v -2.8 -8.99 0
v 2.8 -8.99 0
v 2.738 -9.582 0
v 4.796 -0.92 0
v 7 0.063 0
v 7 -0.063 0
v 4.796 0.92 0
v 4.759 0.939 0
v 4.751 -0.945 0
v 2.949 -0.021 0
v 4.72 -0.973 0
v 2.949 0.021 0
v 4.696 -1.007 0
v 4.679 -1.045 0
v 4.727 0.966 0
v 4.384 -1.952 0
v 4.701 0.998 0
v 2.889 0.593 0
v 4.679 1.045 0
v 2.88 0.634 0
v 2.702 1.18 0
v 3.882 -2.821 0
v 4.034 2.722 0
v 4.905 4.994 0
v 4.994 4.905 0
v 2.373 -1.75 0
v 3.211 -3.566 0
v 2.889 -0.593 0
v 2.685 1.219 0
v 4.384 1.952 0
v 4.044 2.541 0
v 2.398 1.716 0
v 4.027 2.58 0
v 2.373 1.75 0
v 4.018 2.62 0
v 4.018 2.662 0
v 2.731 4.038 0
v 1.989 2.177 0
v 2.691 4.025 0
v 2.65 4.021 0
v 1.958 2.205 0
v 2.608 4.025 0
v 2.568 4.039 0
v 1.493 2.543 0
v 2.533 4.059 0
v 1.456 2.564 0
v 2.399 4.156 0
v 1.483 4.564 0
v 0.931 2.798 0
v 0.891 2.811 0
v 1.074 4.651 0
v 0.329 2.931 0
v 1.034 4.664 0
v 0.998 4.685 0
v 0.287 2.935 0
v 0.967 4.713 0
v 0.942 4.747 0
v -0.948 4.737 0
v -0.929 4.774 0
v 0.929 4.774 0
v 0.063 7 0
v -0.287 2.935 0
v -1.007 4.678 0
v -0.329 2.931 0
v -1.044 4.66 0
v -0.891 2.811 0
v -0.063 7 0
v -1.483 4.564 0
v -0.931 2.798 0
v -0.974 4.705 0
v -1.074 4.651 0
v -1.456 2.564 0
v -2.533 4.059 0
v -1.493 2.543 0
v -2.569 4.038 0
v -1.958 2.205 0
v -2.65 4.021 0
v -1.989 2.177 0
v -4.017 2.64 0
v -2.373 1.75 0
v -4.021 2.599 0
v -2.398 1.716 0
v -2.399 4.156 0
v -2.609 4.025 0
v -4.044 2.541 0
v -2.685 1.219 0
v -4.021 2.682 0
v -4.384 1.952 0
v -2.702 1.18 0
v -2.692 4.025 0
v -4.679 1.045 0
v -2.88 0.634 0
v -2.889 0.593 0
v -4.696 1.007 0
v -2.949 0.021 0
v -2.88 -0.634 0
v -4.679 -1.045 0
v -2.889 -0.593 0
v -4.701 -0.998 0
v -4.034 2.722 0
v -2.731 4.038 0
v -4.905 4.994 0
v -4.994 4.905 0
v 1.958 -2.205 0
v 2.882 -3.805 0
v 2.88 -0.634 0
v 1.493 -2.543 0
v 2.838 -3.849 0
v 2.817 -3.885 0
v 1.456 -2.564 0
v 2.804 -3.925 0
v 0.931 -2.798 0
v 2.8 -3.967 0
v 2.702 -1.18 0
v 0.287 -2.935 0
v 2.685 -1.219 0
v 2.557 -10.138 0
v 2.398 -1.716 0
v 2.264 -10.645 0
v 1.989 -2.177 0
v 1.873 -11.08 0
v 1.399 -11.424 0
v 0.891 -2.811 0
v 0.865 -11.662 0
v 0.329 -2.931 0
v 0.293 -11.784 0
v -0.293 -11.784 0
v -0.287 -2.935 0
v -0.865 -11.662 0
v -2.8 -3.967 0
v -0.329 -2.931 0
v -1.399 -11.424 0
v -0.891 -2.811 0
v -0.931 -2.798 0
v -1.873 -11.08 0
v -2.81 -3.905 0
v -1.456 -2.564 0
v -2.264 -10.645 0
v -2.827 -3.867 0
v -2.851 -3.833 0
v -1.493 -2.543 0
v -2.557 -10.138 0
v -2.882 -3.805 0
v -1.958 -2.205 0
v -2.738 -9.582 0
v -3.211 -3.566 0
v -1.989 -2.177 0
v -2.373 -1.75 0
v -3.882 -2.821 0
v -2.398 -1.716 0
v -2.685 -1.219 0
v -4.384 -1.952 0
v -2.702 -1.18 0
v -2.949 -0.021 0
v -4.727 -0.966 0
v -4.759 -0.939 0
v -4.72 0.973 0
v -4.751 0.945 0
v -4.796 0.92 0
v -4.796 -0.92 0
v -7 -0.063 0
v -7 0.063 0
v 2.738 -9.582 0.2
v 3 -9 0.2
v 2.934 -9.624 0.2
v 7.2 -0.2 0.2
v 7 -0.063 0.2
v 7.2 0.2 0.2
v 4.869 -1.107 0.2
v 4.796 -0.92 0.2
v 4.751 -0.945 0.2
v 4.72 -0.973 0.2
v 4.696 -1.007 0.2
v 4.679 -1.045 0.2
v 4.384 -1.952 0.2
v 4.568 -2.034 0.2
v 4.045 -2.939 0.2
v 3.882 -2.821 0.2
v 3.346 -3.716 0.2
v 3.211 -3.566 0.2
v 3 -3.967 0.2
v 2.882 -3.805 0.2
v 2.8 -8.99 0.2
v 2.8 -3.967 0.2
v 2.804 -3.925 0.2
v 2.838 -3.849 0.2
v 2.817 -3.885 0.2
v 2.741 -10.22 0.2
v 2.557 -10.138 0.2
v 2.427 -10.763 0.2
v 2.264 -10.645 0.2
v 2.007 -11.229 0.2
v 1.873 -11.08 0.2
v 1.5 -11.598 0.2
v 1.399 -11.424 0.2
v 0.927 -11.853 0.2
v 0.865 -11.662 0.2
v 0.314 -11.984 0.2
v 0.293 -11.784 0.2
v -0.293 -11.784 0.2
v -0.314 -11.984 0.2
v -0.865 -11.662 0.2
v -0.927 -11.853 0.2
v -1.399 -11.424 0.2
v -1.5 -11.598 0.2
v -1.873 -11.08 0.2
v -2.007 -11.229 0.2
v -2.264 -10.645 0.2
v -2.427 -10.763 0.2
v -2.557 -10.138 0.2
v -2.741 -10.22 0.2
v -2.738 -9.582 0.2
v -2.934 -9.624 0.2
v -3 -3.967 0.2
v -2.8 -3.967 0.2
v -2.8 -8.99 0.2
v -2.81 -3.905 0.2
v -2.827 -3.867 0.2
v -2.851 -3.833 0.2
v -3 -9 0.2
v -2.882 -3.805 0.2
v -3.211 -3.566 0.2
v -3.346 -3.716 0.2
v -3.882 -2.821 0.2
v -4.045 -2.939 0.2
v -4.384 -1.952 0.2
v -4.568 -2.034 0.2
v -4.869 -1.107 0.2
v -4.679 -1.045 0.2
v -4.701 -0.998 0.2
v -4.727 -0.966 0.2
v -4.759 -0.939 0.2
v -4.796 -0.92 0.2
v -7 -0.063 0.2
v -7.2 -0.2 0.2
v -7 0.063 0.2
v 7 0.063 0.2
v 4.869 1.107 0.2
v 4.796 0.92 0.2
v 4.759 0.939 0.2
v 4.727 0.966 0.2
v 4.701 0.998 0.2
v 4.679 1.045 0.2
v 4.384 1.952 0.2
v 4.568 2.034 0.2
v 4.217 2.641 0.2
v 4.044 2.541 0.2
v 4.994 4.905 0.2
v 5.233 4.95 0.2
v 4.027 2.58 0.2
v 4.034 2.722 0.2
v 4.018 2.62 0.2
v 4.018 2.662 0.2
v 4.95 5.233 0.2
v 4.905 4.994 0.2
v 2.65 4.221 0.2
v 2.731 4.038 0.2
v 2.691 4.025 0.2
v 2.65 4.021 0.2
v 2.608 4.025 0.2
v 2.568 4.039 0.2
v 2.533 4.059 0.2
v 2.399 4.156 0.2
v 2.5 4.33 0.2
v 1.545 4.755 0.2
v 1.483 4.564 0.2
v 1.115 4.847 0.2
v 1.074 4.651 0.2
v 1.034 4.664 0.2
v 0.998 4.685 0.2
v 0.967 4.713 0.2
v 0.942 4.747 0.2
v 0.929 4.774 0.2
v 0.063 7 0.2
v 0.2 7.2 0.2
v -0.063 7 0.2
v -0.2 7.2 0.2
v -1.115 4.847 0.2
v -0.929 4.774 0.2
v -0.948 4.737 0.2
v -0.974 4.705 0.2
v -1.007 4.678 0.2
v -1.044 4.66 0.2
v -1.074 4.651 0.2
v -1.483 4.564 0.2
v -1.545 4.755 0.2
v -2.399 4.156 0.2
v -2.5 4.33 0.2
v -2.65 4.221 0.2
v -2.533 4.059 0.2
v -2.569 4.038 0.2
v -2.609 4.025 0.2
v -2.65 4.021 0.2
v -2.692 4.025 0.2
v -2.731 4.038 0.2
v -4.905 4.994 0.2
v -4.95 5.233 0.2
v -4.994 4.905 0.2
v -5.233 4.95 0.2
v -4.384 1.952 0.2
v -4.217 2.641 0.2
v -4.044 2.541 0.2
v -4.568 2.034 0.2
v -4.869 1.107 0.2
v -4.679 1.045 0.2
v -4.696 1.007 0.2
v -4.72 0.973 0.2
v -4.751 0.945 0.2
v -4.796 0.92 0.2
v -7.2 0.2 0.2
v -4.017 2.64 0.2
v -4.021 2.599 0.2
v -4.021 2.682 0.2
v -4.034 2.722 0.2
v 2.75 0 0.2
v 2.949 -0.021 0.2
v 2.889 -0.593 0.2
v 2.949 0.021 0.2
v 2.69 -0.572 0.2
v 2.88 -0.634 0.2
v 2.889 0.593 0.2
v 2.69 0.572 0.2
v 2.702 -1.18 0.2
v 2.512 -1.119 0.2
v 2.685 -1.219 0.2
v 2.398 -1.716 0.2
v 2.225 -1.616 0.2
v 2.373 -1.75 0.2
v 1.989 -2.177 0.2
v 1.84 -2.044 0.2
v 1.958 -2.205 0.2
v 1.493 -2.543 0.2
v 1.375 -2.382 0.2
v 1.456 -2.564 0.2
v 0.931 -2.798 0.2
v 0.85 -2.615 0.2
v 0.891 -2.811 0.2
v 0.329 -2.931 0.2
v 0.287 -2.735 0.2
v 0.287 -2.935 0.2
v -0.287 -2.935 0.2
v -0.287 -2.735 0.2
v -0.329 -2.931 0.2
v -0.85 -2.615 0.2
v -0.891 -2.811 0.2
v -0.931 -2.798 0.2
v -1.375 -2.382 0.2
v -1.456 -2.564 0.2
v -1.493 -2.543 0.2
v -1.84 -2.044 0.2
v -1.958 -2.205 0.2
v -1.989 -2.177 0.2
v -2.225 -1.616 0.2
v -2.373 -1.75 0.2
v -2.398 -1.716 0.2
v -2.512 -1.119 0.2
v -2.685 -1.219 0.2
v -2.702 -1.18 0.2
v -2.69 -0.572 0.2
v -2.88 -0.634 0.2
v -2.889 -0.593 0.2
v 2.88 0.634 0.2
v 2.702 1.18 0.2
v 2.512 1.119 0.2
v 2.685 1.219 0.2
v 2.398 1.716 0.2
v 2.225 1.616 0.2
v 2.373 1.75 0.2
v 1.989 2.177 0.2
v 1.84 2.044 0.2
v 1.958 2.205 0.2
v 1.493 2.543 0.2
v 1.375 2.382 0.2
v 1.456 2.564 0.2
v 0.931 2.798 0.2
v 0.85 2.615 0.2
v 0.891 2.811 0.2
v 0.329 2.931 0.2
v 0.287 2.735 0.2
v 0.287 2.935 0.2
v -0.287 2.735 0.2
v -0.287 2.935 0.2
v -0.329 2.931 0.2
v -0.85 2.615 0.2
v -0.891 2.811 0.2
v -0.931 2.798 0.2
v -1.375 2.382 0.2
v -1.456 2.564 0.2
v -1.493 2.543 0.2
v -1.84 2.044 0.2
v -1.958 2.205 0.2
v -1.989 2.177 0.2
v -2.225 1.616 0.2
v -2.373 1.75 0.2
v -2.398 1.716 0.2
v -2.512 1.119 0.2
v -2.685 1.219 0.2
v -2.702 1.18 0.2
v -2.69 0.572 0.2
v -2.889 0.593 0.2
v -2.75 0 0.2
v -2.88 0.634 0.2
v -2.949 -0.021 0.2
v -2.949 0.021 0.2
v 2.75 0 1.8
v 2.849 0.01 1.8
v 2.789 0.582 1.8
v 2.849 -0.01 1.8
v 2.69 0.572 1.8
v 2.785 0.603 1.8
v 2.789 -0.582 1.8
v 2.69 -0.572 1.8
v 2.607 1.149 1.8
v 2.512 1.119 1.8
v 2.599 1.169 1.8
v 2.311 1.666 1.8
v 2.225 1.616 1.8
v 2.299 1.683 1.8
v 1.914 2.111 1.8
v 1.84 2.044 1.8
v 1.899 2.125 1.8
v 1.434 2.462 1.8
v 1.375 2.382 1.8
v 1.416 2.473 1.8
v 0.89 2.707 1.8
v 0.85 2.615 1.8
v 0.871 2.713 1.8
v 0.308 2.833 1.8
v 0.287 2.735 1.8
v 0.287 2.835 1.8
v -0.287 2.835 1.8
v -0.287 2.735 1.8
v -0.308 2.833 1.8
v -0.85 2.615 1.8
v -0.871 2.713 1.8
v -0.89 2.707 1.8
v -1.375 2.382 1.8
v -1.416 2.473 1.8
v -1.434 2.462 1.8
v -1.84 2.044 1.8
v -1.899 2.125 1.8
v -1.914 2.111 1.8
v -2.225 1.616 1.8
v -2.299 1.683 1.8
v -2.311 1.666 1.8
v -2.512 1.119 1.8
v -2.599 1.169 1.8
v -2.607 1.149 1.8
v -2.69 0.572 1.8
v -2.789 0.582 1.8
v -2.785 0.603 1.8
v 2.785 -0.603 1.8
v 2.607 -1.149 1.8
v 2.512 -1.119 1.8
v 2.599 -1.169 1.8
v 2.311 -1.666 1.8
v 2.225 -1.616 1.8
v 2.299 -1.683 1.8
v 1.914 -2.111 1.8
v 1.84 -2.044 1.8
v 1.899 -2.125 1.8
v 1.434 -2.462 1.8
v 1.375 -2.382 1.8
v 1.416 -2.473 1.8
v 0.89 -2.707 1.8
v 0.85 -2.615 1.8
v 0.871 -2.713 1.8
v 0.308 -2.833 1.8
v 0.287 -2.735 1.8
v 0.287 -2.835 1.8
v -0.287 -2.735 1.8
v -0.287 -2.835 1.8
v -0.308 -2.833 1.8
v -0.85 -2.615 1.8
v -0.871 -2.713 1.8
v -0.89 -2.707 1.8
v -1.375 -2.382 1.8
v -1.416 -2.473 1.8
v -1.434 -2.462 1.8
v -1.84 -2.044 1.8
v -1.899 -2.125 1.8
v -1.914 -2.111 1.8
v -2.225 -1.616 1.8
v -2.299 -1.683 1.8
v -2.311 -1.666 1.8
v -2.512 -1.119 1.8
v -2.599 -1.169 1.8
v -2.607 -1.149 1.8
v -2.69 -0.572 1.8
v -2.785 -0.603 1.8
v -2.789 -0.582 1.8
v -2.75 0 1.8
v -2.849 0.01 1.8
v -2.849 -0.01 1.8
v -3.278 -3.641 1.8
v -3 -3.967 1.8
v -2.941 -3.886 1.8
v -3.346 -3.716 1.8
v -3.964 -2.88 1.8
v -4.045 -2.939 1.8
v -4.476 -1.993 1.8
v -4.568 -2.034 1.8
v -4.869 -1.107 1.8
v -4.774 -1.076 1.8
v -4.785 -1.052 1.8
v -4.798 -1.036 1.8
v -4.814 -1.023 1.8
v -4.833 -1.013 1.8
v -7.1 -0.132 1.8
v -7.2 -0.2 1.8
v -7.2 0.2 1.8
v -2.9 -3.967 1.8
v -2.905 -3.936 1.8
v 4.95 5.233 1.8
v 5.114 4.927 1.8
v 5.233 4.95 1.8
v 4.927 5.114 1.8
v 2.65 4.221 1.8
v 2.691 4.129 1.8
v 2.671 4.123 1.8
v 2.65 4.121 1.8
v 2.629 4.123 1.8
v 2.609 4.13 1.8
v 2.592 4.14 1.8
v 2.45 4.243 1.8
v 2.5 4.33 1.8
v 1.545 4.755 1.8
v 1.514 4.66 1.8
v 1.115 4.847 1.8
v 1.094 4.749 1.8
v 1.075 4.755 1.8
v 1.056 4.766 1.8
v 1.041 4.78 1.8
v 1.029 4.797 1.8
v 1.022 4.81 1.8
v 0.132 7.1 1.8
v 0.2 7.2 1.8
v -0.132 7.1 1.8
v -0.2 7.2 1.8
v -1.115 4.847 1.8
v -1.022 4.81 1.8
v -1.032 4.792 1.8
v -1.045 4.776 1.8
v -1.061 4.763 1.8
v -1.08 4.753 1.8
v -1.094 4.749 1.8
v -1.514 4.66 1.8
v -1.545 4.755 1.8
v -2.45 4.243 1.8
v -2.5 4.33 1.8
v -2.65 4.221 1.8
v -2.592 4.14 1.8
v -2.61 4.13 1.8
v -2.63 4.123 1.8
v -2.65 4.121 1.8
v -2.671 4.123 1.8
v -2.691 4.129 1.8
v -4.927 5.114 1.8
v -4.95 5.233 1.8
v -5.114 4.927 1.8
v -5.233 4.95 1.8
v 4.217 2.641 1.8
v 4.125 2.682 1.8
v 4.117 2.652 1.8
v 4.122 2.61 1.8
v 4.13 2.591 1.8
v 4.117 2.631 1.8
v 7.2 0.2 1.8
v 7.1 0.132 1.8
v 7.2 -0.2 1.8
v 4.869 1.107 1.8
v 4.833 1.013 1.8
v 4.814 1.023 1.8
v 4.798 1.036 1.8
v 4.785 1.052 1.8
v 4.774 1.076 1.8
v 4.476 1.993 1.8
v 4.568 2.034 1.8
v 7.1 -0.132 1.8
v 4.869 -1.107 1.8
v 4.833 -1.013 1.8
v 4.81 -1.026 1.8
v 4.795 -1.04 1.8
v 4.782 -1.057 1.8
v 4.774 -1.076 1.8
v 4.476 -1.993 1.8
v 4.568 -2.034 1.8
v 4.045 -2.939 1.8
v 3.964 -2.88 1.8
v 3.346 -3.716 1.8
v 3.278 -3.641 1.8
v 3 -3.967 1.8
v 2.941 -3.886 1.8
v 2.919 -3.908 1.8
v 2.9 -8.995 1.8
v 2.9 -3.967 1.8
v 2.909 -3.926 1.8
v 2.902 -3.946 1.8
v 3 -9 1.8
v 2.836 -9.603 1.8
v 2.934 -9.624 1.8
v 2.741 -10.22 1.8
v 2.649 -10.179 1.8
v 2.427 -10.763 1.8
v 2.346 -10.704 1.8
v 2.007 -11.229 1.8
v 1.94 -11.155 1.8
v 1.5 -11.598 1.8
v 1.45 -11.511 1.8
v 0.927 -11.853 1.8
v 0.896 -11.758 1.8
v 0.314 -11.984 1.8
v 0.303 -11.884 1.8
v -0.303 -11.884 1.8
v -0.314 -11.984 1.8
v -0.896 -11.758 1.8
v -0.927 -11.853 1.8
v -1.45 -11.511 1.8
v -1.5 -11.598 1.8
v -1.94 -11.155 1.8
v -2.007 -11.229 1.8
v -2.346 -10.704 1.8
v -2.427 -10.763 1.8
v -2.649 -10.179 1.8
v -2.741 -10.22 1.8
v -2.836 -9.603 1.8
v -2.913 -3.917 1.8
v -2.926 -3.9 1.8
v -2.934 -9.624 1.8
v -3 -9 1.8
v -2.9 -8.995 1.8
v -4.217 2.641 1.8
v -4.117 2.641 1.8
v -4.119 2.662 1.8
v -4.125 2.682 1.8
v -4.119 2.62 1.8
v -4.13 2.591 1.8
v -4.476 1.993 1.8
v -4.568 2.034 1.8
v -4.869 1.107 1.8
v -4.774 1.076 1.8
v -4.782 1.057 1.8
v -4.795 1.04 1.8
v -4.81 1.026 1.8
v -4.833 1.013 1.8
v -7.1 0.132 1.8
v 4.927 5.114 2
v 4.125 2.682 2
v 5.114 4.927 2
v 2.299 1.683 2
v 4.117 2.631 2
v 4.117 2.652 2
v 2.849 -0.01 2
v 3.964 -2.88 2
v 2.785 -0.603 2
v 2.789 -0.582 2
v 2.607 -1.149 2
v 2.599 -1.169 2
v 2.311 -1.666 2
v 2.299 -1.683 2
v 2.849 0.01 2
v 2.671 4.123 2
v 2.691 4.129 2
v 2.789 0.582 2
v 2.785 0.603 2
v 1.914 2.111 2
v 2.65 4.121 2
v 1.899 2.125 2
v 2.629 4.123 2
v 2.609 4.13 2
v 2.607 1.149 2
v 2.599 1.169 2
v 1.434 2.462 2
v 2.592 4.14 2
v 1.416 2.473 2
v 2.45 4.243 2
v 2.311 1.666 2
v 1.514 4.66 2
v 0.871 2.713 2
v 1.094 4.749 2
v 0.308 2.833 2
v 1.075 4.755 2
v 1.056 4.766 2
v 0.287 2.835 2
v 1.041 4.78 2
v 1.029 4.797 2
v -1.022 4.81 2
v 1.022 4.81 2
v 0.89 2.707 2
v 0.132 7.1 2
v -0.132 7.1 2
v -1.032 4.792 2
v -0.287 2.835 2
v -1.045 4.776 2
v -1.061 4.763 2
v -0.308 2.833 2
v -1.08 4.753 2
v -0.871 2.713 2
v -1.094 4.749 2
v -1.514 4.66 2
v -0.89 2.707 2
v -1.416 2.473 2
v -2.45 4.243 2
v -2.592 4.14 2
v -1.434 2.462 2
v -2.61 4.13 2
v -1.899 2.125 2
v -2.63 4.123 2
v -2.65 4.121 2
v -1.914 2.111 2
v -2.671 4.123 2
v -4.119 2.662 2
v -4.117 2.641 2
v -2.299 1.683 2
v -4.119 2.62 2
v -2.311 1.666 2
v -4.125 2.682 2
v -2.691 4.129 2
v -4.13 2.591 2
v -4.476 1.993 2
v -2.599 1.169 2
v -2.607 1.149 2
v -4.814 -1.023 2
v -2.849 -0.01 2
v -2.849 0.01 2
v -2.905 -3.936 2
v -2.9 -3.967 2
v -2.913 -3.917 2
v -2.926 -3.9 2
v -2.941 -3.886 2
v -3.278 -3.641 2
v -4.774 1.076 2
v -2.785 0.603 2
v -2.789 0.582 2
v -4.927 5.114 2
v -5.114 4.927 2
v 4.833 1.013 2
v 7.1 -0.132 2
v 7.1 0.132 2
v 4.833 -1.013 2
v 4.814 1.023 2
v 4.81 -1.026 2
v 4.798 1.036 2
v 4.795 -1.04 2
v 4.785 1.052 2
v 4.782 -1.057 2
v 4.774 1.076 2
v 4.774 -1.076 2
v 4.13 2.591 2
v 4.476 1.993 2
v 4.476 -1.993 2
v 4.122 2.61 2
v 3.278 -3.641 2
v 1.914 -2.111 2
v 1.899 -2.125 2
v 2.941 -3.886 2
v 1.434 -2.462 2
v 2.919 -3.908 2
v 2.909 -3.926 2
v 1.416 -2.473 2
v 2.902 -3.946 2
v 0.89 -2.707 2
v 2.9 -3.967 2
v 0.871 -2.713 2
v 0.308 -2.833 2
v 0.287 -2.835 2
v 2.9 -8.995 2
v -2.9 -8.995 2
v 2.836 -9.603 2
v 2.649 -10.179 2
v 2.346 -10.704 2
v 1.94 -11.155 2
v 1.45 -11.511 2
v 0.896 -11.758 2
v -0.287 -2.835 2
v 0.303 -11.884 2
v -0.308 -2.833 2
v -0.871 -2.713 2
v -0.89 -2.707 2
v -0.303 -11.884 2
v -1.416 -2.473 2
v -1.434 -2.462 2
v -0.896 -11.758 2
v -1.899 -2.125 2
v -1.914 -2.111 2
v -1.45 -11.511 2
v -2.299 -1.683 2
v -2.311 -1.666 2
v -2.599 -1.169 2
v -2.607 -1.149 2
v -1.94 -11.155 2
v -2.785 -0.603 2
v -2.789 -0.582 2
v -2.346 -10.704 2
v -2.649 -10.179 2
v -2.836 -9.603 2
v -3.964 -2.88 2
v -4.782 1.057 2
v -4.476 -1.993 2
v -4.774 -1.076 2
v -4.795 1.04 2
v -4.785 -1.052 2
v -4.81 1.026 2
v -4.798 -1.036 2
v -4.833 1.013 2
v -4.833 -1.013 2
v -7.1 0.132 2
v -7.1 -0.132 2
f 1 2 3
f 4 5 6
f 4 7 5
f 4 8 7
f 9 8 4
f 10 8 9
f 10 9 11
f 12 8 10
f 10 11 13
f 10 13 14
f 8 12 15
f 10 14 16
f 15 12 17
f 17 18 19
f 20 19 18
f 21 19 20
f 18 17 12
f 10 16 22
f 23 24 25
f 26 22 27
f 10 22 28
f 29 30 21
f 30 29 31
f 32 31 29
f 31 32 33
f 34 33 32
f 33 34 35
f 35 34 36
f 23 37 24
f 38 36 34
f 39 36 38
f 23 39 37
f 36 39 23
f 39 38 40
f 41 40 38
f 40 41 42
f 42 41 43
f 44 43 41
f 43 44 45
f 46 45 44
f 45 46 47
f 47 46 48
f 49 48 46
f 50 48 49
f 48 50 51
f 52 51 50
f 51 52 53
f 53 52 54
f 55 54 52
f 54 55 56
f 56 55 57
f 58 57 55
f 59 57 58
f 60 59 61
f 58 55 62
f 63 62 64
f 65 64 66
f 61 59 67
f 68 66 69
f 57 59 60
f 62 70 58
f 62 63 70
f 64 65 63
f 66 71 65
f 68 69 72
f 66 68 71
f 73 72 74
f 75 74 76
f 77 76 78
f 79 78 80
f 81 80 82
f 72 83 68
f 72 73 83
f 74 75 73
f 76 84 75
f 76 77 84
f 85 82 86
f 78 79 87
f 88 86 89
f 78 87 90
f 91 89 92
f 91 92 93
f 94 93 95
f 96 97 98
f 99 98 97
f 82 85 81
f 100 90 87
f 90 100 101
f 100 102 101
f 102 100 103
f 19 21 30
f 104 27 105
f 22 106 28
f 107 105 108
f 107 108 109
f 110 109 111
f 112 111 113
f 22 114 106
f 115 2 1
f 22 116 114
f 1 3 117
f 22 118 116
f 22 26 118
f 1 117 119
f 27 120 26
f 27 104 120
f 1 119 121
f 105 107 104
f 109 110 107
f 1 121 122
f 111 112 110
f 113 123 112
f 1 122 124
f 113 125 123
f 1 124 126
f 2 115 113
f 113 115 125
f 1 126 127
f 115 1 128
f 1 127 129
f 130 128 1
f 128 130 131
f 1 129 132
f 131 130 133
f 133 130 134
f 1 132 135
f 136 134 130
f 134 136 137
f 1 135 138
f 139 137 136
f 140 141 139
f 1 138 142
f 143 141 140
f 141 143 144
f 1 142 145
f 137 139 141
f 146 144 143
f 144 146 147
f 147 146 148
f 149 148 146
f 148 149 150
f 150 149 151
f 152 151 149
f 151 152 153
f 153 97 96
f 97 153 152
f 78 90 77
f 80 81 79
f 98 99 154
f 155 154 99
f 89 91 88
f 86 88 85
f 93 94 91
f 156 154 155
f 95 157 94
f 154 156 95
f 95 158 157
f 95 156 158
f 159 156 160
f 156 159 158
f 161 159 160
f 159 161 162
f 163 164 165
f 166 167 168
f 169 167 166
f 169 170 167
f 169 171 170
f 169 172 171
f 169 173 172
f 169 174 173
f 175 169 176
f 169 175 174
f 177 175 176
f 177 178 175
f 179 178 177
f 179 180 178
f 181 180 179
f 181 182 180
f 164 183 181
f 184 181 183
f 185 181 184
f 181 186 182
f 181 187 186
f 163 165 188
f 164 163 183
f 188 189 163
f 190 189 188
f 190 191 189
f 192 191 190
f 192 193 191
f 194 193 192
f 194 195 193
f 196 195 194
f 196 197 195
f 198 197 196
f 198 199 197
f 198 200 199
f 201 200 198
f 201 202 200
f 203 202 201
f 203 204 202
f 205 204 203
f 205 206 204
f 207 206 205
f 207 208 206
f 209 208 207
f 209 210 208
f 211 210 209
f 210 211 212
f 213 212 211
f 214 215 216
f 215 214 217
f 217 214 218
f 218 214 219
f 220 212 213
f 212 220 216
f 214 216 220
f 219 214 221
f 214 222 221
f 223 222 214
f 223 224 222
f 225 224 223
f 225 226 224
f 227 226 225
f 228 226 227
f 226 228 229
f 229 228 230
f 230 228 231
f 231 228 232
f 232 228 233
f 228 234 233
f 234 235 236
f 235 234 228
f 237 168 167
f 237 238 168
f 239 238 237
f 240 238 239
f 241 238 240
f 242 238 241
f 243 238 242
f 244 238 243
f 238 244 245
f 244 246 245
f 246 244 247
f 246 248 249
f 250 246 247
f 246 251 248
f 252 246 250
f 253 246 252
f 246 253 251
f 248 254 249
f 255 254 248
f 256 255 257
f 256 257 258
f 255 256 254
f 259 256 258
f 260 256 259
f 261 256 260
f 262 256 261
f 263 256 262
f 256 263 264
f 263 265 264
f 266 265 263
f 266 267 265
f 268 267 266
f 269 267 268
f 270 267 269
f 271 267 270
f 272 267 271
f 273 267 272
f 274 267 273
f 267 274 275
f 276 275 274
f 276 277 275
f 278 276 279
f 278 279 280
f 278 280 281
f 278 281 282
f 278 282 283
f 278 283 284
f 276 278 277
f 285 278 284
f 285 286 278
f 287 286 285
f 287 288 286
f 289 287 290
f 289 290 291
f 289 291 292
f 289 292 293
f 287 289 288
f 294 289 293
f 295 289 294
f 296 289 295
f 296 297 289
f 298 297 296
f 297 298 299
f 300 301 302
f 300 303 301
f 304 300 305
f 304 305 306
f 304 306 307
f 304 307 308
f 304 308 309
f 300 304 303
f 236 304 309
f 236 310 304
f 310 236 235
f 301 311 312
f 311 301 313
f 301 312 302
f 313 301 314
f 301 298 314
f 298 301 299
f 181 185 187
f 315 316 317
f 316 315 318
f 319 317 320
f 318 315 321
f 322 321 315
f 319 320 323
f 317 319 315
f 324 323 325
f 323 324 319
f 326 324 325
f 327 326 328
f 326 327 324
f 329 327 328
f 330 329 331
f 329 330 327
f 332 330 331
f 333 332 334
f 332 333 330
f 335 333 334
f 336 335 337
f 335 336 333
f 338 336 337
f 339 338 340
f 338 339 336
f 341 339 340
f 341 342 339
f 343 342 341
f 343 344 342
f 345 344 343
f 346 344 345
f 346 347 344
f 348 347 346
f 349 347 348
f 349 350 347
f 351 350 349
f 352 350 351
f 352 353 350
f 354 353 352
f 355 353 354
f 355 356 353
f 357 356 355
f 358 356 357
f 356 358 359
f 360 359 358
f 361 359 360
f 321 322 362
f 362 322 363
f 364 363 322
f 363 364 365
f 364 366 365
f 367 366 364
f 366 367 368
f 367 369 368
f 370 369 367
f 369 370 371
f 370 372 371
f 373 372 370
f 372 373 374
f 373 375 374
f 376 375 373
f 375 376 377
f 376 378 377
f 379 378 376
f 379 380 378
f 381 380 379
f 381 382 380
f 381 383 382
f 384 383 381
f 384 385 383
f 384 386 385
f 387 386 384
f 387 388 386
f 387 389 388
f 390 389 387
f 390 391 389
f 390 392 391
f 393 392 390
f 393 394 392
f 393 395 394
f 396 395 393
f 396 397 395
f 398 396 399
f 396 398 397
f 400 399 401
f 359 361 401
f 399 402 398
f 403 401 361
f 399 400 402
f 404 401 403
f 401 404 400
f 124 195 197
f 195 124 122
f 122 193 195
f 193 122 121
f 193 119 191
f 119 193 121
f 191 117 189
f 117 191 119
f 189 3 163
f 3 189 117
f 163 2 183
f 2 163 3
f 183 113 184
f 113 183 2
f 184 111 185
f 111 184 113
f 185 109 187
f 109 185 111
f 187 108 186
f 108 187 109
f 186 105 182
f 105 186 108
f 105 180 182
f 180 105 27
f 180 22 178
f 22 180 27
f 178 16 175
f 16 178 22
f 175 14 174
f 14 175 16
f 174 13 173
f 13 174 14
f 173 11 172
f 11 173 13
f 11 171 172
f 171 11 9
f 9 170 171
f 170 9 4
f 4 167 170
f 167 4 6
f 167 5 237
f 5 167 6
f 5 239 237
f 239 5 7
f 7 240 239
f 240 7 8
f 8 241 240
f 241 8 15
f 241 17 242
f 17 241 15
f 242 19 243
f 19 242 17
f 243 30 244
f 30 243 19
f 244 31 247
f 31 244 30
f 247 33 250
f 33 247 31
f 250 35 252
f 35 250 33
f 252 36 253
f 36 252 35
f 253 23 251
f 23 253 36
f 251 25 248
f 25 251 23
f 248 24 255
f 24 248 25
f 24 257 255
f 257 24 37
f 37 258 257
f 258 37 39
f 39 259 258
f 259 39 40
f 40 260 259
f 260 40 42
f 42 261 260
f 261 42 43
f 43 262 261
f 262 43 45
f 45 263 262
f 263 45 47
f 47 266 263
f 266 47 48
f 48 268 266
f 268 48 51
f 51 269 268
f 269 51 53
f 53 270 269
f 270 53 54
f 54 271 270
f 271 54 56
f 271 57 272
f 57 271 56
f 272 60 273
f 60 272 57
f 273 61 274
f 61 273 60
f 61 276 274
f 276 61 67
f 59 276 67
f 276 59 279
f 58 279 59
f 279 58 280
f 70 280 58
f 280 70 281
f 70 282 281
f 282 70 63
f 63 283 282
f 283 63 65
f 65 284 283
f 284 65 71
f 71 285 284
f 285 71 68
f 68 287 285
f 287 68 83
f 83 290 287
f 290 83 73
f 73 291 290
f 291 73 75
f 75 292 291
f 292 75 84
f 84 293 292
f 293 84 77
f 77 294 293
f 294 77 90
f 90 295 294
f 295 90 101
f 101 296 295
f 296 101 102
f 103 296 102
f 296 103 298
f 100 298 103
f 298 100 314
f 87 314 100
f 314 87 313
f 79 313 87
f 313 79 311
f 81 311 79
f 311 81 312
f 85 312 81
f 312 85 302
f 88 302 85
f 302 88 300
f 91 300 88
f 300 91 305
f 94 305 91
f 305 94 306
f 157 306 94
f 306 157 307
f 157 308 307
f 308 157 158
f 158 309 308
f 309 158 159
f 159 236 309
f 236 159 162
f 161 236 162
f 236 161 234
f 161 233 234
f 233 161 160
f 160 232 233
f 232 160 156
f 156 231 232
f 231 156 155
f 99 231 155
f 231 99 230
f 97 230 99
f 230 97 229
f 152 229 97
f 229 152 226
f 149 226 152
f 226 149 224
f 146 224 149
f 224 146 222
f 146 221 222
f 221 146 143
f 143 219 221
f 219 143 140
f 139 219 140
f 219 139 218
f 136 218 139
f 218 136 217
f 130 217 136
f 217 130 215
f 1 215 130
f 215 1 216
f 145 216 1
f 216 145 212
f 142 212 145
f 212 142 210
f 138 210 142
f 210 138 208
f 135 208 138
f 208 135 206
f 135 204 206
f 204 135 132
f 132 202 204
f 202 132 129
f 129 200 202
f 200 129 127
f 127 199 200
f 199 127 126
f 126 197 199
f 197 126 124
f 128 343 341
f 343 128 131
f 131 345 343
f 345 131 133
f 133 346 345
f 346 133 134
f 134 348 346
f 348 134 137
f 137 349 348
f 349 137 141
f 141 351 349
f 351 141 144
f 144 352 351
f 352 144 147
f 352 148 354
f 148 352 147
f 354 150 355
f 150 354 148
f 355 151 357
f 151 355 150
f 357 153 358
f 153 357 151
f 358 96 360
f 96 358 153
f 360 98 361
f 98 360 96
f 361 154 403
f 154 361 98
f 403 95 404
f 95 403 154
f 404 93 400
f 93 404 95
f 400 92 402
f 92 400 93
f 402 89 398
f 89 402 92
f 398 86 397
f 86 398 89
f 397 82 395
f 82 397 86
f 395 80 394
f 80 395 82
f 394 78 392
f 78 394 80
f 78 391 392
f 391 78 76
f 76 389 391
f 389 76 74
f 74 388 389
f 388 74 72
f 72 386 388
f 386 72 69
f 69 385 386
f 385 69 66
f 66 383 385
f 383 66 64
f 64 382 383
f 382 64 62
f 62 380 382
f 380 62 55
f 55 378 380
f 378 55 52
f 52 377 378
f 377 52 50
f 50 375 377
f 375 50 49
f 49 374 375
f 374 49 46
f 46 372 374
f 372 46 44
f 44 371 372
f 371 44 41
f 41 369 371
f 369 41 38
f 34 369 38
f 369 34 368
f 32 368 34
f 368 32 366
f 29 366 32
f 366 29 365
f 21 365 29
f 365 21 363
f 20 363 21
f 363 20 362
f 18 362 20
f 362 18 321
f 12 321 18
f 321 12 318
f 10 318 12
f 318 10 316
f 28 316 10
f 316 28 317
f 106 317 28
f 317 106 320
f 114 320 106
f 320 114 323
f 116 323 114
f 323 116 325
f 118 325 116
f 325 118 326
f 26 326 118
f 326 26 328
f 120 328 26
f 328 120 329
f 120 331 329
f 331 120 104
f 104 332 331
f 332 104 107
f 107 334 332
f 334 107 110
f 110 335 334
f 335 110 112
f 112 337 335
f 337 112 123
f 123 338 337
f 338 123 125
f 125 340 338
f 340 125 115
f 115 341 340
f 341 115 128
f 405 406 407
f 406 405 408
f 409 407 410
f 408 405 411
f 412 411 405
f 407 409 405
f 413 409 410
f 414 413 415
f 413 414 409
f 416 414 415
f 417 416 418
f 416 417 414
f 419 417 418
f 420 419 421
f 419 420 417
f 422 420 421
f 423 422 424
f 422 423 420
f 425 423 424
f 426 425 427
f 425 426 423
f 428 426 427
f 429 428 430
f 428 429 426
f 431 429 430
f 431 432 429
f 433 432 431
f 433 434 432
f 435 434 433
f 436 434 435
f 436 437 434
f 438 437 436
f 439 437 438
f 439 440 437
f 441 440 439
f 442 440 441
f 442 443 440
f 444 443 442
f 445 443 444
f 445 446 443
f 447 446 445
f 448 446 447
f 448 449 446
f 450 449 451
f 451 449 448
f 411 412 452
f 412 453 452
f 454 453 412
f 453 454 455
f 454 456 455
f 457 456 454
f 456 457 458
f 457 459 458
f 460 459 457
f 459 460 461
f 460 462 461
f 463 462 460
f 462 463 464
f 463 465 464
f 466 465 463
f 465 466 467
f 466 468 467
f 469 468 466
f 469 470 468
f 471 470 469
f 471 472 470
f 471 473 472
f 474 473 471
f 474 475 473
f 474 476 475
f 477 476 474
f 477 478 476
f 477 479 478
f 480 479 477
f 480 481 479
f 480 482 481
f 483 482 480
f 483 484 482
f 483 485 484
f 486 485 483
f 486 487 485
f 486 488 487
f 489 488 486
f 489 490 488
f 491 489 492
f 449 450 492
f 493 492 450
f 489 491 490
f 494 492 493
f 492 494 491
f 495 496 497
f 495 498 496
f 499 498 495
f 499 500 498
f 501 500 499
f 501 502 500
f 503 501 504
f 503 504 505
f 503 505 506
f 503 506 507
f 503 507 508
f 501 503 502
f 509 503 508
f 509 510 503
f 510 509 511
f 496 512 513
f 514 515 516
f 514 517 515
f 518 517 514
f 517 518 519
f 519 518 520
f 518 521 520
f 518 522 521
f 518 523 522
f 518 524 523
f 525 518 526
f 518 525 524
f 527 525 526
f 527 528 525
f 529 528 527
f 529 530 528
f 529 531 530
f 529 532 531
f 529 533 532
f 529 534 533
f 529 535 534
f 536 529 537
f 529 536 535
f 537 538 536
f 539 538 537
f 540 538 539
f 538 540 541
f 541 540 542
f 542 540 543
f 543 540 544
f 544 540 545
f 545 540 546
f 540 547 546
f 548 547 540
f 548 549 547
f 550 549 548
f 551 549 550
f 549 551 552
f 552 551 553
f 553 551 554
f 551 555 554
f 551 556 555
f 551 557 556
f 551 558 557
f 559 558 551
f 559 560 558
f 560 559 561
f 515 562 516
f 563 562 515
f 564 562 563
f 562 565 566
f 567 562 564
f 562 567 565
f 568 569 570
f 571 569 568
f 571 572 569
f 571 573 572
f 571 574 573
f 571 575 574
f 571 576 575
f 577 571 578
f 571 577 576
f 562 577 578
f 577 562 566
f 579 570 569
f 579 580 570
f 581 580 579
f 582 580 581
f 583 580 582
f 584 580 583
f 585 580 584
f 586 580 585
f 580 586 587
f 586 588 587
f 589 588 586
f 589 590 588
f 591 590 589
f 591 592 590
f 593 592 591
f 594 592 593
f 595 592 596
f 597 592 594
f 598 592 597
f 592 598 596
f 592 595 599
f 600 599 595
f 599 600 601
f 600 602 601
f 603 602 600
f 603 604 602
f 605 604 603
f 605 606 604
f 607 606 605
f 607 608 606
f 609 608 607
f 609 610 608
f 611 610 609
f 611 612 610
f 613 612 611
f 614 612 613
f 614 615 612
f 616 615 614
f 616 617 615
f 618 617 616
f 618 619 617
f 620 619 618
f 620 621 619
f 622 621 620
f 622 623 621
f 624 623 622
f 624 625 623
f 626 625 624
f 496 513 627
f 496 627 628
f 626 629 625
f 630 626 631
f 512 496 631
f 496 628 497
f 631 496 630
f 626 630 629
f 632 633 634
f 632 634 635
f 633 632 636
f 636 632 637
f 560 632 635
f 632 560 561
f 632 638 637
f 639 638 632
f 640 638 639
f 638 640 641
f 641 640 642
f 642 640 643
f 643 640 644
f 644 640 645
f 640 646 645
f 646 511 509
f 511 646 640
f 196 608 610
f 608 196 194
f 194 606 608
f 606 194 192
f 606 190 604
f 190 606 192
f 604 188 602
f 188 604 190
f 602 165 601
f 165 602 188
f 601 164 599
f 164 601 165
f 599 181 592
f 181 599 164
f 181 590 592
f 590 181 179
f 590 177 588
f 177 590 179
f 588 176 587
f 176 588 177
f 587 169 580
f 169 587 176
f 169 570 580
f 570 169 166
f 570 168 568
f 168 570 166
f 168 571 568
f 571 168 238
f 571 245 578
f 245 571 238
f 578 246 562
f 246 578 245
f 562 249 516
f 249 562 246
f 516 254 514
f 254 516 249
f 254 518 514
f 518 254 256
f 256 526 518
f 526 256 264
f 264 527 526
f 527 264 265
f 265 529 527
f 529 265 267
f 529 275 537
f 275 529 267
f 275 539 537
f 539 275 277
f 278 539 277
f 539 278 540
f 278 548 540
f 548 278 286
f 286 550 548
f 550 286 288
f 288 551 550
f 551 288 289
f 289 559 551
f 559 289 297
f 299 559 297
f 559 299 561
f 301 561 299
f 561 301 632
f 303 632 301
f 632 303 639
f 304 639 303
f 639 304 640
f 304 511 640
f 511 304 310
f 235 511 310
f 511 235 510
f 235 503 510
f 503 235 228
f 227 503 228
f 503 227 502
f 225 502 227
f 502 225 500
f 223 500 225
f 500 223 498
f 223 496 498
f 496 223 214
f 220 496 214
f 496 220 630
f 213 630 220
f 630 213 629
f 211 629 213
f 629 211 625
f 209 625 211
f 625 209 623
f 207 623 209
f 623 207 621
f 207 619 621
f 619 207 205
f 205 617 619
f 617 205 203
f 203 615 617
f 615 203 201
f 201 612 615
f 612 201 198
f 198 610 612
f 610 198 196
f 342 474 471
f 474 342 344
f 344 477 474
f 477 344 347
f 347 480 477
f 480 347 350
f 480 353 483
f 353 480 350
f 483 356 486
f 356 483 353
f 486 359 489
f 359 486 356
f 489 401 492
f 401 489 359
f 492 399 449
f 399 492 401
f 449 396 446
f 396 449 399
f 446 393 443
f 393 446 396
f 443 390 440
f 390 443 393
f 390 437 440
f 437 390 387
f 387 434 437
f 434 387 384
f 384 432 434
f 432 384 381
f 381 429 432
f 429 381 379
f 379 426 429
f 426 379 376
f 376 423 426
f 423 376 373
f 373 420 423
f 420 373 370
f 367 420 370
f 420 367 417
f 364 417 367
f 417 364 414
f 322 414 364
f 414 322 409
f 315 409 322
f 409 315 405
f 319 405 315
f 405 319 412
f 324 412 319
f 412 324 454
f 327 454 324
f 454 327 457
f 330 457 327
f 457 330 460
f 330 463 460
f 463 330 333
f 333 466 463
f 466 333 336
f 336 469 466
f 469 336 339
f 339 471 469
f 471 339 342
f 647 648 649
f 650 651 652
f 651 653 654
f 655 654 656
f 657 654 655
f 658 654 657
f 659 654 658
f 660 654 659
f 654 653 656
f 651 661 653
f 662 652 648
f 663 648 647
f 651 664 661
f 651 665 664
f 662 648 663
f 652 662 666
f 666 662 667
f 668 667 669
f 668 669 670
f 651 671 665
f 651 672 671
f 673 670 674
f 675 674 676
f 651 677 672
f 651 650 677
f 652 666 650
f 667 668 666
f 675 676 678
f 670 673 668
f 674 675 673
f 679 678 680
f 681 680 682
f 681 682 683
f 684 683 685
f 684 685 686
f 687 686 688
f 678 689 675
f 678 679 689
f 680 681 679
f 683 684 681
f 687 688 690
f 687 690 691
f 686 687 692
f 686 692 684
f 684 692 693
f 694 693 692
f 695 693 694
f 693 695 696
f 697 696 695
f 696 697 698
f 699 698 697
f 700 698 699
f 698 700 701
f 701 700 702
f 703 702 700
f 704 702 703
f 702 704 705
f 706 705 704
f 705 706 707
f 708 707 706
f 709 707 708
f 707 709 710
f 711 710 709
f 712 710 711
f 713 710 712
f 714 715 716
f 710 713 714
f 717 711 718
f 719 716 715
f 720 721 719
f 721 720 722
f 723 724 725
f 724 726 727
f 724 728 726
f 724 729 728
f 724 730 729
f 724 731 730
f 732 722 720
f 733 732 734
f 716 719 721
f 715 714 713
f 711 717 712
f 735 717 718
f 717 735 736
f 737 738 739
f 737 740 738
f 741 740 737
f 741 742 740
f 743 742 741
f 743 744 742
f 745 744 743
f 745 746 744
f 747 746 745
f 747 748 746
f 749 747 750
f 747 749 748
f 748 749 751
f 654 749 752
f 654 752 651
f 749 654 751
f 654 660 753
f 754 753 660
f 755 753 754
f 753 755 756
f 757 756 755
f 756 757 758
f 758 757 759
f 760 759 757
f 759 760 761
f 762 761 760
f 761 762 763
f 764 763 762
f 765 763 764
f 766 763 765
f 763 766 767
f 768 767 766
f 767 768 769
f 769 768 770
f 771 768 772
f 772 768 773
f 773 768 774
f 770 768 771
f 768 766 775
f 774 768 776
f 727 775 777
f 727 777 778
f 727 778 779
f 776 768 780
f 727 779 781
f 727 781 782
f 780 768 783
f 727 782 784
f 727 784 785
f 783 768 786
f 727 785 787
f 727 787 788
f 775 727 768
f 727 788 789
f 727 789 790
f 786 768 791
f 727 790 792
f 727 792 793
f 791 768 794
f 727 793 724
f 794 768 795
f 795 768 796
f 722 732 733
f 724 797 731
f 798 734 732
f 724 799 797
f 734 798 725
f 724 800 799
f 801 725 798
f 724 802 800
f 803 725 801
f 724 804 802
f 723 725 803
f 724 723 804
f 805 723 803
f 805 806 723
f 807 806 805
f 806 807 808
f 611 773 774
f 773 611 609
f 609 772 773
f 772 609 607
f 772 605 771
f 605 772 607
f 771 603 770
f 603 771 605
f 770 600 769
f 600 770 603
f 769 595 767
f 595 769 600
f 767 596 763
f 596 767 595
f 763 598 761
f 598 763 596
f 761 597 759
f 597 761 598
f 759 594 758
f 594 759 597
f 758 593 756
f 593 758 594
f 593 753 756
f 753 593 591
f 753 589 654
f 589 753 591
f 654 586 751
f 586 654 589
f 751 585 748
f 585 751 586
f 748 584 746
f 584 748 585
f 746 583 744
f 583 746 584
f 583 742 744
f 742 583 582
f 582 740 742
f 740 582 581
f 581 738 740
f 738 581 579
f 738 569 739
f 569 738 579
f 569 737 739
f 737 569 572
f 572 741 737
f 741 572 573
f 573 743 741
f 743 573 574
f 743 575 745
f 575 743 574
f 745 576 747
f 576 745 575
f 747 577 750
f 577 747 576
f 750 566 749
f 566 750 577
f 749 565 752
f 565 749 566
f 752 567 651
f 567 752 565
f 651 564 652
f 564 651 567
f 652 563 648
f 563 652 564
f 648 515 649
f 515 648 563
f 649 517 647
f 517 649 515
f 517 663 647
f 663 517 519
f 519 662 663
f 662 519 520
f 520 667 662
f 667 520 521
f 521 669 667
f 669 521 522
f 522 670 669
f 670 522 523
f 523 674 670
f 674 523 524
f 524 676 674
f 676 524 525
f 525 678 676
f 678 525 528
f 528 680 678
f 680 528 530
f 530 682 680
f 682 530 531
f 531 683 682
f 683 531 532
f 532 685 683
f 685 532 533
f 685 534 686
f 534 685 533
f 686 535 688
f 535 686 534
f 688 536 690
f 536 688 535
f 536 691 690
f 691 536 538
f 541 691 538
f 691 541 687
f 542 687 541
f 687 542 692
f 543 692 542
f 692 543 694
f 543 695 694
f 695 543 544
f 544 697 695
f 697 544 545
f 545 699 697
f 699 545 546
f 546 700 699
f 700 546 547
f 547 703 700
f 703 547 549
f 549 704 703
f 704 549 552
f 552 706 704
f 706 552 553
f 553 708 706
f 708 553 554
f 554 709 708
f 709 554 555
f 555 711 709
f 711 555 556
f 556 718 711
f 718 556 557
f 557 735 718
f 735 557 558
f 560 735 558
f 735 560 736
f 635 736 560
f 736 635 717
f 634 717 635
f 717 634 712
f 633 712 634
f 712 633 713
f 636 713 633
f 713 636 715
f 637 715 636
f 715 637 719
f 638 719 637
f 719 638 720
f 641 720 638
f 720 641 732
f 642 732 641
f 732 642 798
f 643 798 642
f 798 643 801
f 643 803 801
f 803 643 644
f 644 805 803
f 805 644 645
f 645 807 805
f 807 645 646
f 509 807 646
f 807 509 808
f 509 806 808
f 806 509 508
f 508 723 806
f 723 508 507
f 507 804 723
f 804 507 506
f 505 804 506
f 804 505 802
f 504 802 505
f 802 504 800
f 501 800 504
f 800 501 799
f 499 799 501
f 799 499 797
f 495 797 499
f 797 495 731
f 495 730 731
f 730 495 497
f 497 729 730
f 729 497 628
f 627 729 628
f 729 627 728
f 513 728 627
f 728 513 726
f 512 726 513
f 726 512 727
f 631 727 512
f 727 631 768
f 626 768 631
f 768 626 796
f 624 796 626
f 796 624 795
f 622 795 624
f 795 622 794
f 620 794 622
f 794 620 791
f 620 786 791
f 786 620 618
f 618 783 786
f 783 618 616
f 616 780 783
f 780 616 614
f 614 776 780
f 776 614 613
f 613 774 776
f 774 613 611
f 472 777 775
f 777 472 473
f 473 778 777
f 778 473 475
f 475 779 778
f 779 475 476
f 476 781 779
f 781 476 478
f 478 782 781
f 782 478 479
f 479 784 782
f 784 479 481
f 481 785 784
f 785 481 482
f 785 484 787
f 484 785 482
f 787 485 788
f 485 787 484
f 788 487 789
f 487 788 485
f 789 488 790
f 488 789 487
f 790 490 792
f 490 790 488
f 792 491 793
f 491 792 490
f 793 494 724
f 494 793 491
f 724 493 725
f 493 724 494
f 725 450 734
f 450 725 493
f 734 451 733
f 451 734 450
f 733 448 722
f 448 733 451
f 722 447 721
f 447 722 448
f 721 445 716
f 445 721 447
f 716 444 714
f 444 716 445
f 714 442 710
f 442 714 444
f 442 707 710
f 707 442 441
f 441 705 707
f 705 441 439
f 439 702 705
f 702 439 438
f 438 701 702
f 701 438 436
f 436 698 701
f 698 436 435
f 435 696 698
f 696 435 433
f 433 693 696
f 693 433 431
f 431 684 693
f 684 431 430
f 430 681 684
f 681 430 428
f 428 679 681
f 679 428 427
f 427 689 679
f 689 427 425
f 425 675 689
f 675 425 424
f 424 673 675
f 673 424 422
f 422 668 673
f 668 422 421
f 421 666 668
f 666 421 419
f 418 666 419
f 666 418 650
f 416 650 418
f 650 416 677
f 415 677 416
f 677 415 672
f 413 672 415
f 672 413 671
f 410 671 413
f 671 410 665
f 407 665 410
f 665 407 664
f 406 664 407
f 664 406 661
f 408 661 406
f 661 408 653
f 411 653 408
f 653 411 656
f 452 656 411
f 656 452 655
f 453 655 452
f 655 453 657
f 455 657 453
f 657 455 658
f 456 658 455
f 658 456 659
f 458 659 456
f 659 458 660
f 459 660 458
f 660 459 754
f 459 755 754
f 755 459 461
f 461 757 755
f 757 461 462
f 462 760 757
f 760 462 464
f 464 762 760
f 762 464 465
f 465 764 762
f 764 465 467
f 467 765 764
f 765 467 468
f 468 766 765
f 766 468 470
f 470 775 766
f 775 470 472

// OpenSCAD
width = 14;
height = 2;
points = 2;
$fn = 30;
eps = 0.0001;

module profile() {
  difference() {
    union() {
      circle(d = width - 2*points);
      for (a = [-90, -45, 0, 45, 90]) {
        rotate([0, 0, a]) {
          hull() {
            square([6, eps], center=true);
            translate([0, width/2])
              square(0.4, center=true);
          }
        }
      }
      hull() {
        circle(d=6);
        translate([0, -9])
          circle(d=6);
      }
    }
    circle(d=5.5);
  }
}

linear_extrude(0.2)
  offset(-0.2)
    profile();
translate([0, 0, 0.2])
  linear_extrude(height - 0.4)
    profile();
translate([0, 0, height - 0.2])
  linear_extrude(0.2)
    offset(-0.1)
      profile();
